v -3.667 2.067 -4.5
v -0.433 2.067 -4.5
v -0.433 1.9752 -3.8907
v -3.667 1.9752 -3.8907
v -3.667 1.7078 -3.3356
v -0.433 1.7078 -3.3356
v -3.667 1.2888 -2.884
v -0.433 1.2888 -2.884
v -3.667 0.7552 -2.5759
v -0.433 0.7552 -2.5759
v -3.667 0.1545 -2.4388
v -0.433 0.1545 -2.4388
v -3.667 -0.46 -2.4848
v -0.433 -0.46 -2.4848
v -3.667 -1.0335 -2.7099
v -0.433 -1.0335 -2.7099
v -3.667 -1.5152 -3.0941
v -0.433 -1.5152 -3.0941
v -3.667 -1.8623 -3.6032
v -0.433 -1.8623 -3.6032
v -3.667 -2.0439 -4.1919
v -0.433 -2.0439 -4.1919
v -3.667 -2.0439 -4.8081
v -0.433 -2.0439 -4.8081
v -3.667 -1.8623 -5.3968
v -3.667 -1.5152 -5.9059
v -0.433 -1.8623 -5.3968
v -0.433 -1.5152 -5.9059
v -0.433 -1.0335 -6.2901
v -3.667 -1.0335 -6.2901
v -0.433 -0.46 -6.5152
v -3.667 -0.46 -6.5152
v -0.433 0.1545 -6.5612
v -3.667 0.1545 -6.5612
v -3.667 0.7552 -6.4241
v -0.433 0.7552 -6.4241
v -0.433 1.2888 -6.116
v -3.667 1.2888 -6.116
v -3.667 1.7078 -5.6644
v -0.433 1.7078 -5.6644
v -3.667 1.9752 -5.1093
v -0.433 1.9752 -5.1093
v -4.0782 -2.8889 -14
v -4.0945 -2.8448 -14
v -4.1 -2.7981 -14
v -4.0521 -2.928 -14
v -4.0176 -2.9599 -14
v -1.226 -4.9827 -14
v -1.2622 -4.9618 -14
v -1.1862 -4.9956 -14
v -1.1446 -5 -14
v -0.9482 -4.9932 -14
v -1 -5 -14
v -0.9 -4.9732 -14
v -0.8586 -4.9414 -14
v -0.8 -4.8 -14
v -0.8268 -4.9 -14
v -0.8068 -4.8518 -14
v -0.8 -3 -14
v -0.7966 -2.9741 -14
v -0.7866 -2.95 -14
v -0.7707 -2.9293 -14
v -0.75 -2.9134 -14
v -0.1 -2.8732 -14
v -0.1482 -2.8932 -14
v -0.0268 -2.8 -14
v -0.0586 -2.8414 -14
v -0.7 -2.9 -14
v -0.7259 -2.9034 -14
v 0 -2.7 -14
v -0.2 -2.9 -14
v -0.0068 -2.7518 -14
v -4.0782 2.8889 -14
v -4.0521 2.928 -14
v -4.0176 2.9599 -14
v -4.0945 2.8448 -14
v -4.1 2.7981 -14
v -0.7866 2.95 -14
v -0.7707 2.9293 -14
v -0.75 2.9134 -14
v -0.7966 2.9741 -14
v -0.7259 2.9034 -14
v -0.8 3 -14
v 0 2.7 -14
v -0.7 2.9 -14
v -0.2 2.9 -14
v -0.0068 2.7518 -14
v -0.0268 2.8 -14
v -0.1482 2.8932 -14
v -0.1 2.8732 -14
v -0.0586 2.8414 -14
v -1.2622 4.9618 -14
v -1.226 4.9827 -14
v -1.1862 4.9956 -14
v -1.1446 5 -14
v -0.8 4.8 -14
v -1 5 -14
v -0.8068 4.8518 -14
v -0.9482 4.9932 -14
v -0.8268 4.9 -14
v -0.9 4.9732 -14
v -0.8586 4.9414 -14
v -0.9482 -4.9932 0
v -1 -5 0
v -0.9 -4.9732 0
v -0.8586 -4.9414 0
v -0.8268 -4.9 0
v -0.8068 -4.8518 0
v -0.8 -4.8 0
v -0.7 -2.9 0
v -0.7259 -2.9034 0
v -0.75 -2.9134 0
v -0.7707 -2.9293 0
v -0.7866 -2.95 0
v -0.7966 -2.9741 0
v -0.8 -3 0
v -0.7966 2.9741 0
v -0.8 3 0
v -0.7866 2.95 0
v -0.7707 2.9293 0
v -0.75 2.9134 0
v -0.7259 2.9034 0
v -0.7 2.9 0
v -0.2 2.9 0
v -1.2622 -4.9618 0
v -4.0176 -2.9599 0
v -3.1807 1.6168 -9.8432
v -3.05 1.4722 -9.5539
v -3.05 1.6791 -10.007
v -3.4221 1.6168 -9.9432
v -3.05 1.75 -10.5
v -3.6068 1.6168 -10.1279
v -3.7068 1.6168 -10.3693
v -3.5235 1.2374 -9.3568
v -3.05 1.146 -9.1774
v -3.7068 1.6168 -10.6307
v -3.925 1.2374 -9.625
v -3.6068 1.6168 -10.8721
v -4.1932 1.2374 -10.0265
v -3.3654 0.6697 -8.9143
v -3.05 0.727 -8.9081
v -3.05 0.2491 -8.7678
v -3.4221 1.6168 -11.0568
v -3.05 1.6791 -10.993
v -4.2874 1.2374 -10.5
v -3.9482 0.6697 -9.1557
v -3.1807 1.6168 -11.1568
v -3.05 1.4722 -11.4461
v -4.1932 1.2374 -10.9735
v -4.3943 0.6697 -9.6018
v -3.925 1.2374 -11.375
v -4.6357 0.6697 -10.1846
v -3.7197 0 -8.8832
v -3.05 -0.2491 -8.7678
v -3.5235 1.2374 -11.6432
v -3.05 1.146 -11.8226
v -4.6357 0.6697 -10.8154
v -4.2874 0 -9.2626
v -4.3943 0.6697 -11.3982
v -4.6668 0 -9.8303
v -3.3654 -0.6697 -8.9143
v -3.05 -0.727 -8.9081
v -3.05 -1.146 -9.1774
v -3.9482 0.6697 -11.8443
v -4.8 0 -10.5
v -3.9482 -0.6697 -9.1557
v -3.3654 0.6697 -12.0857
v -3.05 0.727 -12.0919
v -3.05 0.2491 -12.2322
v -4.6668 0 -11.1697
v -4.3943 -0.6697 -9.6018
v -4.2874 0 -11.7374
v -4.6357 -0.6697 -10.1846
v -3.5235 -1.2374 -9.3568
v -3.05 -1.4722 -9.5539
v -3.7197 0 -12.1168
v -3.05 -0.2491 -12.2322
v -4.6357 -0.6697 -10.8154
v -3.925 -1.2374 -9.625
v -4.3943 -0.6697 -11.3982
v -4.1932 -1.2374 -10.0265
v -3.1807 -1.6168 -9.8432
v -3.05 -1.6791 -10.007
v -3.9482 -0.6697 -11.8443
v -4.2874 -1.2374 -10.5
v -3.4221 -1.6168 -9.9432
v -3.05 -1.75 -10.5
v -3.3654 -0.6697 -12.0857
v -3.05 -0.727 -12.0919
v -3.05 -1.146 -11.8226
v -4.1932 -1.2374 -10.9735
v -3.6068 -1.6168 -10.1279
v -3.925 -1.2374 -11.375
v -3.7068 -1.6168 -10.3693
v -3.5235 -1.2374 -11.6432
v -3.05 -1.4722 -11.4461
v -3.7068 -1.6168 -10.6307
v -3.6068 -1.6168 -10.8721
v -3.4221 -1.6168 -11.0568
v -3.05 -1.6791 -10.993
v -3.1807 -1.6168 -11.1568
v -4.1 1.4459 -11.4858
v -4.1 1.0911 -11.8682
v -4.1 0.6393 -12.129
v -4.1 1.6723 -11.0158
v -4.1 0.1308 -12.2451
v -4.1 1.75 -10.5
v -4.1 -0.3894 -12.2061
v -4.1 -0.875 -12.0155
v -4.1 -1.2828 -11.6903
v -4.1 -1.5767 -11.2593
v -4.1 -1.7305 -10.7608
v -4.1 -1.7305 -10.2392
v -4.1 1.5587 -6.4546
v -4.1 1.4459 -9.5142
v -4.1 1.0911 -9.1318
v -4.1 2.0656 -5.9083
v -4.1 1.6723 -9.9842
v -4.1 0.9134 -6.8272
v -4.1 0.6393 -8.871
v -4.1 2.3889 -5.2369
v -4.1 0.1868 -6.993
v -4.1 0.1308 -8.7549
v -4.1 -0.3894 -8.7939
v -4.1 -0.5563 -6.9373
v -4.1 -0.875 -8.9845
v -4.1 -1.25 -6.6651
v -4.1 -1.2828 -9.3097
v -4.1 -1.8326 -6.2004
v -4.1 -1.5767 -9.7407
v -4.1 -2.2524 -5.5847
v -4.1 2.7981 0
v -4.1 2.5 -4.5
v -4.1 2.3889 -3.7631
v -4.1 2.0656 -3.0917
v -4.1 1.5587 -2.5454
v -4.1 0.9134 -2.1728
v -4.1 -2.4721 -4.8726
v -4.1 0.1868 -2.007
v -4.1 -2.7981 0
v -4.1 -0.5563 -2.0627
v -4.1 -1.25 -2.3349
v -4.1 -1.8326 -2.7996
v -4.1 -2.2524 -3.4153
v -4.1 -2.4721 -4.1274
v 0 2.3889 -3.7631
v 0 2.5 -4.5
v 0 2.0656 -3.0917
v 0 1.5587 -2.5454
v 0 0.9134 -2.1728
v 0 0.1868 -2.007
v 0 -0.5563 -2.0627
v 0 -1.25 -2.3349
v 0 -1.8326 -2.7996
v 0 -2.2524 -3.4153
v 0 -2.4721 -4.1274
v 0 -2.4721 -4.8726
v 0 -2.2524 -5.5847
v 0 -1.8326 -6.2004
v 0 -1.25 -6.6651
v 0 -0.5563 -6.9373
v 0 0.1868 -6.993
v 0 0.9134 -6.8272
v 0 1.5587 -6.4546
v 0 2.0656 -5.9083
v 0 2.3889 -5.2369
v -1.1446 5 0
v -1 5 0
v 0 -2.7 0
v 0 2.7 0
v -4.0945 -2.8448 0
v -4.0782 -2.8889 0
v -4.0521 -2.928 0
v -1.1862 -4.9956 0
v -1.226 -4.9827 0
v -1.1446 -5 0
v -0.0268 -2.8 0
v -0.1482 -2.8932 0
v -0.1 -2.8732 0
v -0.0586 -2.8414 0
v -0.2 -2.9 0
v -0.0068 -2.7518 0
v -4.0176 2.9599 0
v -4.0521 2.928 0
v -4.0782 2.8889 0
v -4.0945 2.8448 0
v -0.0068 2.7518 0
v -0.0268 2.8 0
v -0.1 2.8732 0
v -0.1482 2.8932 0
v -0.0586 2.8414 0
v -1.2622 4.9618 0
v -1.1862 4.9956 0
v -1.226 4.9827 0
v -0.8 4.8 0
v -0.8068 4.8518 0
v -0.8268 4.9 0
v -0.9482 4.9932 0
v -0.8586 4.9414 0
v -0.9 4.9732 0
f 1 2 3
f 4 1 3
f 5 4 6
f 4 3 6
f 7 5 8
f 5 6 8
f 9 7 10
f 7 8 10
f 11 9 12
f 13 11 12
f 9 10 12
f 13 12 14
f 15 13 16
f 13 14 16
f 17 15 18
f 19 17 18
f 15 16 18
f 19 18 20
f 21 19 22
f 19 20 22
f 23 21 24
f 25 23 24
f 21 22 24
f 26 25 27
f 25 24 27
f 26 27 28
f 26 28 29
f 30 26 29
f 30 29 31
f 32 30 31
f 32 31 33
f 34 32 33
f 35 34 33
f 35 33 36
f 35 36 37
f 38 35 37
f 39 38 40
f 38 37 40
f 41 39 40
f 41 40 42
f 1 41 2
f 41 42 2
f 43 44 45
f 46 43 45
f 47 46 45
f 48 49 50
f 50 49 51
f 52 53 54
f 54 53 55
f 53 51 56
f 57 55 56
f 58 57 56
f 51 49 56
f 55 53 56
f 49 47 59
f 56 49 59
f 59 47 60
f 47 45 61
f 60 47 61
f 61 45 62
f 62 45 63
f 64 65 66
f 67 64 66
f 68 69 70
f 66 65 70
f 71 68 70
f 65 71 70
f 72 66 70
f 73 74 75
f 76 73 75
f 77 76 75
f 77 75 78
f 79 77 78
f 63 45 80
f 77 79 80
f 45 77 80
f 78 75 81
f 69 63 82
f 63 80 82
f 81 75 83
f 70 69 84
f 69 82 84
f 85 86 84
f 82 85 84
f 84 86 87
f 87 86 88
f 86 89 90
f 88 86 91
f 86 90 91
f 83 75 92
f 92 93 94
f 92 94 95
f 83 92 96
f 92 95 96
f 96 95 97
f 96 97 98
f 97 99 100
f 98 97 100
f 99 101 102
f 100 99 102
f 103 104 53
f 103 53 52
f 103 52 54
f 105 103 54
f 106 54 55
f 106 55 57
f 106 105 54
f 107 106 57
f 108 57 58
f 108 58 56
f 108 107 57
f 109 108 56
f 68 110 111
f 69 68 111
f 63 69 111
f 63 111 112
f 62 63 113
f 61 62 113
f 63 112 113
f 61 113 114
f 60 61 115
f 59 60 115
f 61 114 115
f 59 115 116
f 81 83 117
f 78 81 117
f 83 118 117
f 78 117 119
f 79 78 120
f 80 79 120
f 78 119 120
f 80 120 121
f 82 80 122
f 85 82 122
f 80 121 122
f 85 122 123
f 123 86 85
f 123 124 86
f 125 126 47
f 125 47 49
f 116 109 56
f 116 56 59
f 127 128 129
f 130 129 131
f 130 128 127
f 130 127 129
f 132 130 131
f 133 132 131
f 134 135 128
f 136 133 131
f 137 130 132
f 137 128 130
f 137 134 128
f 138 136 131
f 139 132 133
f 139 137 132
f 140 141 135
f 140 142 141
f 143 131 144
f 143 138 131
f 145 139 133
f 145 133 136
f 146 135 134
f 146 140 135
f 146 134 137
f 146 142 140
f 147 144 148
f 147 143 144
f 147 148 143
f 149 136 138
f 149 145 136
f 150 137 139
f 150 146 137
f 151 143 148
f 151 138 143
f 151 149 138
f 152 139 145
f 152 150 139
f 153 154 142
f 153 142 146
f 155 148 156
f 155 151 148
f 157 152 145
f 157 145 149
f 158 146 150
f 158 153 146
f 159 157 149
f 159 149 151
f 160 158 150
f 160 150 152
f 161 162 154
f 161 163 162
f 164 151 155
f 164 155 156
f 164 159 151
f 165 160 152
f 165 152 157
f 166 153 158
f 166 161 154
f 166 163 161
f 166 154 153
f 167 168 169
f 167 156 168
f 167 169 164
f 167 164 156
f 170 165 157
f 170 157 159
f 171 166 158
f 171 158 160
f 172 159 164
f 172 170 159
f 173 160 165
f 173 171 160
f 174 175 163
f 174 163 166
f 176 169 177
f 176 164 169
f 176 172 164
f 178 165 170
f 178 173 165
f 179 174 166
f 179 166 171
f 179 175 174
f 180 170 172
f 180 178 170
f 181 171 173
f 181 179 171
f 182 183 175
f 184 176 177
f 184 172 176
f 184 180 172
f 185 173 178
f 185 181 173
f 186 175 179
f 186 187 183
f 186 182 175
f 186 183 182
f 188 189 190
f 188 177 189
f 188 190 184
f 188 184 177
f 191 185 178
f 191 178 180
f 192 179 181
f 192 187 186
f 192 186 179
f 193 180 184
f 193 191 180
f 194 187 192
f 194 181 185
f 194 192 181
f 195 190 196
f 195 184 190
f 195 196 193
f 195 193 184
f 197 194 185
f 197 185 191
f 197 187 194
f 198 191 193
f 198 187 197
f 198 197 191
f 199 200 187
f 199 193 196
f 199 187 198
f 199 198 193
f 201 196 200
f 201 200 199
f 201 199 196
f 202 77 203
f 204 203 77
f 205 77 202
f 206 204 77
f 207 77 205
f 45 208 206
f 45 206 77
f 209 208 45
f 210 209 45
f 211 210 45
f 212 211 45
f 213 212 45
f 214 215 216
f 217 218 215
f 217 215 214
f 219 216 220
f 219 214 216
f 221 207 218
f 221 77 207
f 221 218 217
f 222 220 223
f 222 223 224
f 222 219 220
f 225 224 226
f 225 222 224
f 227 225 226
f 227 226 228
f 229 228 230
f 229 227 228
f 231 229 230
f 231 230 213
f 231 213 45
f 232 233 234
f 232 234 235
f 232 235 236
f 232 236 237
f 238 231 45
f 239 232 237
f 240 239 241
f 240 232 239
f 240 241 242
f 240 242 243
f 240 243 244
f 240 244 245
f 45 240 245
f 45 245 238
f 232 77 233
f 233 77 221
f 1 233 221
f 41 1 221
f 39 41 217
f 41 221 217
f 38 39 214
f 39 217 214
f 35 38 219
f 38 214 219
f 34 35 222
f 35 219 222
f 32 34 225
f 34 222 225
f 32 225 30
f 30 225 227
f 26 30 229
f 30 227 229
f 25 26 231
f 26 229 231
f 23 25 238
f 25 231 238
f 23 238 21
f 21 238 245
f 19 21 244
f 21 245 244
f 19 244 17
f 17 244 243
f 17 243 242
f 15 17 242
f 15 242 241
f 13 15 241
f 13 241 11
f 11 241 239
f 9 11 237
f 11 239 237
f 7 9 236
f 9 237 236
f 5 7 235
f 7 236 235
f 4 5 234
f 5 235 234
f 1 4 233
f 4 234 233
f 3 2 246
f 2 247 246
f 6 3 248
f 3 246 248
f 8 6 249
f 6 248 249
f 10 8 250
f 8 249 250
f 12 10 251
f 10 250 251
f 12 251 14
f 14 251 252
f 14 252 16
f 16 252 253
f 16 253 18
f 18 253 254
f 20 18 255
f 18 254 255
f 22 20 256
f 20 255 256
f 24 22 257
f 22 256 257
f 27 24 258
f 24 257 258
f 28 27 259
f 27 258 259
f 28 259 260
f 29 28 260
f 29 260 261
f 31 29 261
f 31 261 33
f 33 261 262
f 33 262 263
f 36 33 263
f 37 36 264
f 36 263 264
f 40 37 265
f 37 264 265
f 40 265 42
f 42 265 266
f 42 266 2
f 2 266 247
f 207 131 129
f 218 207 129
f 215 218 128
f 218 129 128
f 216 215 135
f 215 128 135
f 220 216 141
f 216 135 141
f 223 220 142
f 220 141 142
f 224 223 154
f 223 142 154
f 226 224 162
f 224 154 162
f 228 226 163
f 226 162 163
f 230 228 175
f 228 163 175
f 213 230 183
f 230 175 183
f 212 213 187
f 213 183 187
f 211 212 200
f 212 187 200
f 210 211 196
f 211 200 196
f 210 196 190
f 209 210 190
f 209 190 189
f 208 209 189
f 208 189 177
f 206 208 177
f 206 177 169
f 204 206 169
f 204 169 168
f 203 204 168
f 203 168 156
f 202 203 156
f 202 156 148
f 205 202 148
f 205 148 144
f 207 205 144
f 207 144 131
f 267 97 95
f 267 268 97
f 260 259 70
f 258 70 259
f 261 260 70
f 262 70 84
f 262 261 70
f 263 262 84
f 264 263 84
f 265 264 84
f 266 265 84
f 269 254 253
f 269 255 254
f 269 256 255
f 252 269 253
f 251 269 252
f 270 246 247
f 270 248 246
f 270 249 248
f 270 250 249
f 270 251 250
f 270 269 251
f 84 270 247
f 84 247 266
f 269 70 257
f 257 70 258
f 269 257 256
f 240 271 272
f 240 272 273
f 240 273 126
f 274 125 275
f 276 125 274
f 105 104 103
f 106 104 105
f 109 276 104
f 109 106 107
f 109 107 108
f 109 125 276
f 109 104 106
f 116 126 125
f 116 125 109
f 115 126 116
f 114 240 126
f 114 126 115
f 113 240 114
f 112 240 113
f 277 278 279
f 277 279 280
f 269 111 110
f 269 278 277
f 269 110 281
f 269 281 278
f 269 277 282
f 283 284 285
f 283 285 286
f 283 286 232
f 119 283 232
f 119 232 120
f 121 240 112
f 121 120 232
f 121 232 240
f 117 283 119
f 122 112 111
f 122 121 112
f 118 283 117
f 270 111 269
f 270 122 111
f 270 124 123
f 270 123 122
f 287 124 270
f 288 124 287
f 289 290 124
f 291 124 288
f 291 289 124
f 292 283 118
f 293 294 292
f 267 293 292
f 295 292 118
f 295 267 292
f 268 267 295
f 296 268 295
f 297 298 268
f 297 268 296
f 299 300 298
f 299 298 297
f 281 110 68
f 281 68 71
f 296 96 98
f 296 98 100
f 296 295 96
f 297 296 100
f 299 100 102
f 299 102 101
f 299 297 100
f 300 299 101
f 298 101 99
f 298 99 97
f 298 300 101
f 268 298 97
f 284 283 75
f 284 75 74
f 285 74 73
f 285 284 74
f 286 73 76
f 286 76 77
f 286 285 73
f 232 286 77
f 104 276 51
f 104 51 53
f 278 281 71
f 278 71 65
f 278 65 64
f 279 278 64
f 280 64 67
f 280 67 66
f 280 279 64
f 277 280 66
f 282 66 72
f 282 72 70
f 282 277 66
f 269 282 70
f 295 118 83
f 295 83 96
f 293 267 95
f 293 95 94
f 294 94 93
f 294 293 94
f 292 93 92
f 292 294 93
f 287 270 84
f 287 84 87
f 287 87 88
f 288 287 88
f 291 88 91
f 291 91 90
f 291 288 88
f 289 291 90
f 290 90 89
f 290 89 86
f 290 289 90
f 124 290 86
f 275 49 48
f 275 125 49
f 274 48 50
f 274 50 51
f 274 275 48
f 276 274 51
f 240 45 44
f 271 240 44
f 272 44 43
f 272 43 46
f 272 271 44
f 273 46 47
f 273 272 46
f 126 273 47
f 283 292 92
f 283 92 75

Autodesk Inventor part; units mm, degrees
sketch "_____1" plane through (0, 0, 0) normal (0, 0, 1) x (1, 0, 0)
  line L0 (-4.1, 2.7981) -> (-4.1, -2.7981)
  arc A0 (-4.1, -2.7981) -> (-4.0176, -2.9599) centre (-3.9, -2.7981) ccw
  line L1 (-4.0176, -2.9599) -> (-1.2622, -4.9618)
  arc A1 (-1.2622, -4.9618) -> (-1.1446, -5) centre (-1.1446, -4.8) ccw
  line L2 (-1.1446, -5) -> (-1, -5)
  arc A2 (-1, -5) -> (-0.8, -4.8) centre (-1, -4.8) ccw
  line L3 (-0.8, -4.8) -> (-0.8, -3)
  arc A3 (-0.7, -2.9) -> (-0.8, -3) centre (-0.7, -3) ccw
  line L4 (-0.7, -2.9) -> (-0.2, -2.9)
  arc A4 (-0.2, -2.9) -> (0, -2.7) centre (-0.2, -2.7) ccw
  line L5 (0, -2.7) -> (0, 2.7)
  arc A5 (0, 2.7) -> (-0.2, 2.9) centre (-0.2, 2.7) ccw
  line L6 (-0.2, 2.9) -> (-0.7, 2.9)
  arc A6 (-0.8, 3) -> (-0.7, 2.9) centre (-0.7, 3) ccw
  line L7 (-0.8, 3) -> (-0.8, 4.8)
  arc A7 (-0.8, 4.8) -> (-1, 5) centre (-1, 4.8) ccw
  line L8 (-1, 5) -> (-1.1446, 5)
  arc A8 (-1.1446, 5) -> (-1.2622, 4.9618) centre (-1.1446, 4.8) ccw
  line L9 (-1.2622, 4.9618) -> (-4.0176, 2.9599)
  arc A9 (-4.0176, 2.9599) -> (-4.1, 2.7981) centre (-3.9, 2.7981) ccw
extrude "Extrusion1" add sketch "_____1" against normal blind 14
sketch "_____2" plane through (0, 0, -4.5) normal (0, 0, 1) x (1, 0, 0)
  line L0 (0, 0) -> (-4.1, 0)
  line L1 (-4.1, 0) -> (-4.1, 2.5)
  line L2 (-4.1, 2.5) -> (-3.667, 2.067)
  line L3 (-3.667, 2.067) -> (-0.433, 2.067)
  line L4 (-0.433, 2.067) -> (0, 2.5)
  line L5 (0, 2.5) -> (0, 0)
  line L6 (0, 0) -> (-4.1, 0)
revolve "Revolution1" cut sketch "_____2" angle 360 about axis through (0, 0, -4.5) along (1, 0, 0)
thread "Thread1" size "M5x0.8" class "6H" standard "ISO Metric profile" full length
sketch "_____3" plane through (0, 0, -10.5) normal (0, 0, 1) x (1, 0, 0)
  line L0 (-3.05, 0) -> (-4.8, 0)
  line L1 (-4.8, 0) -> (-4.8, 1.75)
  line L2 (-4.8, 1.75) -> (-3.05, 1.75)
  line L3 (-3.05, 1.75) -> (-3.05, 0)
  line L4 (-3.05, 0) -> (-4.8, 0)
revolve "Revolution2" cut sketch "_____3" angle 360 about axis through (-3.05, 0, -10.5) along (1, 0, 0)
sketch "_____4" plane through (0, 0, -10.5) normal (0, 0, 1) x (1, 0, 0)
  line L0 (-3.05, 1.75) -> (-3.05, -1.75)
  arc A0 (-3.05, 1.75) -> (-3.05, -1.75) centre (-3.05, 0) ccw
  line L1 (-3.05, 1.75) -> (-3.05, -1.75)
revolve "Revolution3" add sketch "_____4" angle 360 about axis through (-3.05, 1.75, -10.5) along (0, 1, 0)
ref_plane "to_blackets_XY" through (0, 0, -4.5) normal (1, 0, 0) x (0, 0, -1)
ref_plane "to_blackets_YZ" through (0, 0, -4.5) normal (0, 0, -1) x (0, 1, 0)
ref_plane "to_blackets_ZX" through (0, 0, -4.5) normal (0, 1, 0) x (1, 0, 0)
ref_plane "to_bolt_XY" through (-4.1, 0, -4.5) normal (1, 0, 0) x (0, 0, -1)
ref_plane "to_bolt_YZ" through (-4.1, 0, -4.5) normal (0, 0, -1) x (0, 1, 0)
ref_plane "to_bolt_ZX" through (-4.1, 0, -4.5) normal (0, 1, 0) x (1, 0, 0)
ref_plane "to_frames_XY" through (-0.8, 0, -4.5) normal (1, 0, 0) x (0, 0, -1)
ref_plane "to_frames_YZ" through (-0.8, 0, -4.5) normal (0, 0, -1) x (0, 1, 0)
ref_plane "to_frames_ZX" through (-0.8, 0, -4.5) normal (0, 1, 0) x (1, 0, 0)
properties part number "HNTU5-5" material "ステンレス鋼"
